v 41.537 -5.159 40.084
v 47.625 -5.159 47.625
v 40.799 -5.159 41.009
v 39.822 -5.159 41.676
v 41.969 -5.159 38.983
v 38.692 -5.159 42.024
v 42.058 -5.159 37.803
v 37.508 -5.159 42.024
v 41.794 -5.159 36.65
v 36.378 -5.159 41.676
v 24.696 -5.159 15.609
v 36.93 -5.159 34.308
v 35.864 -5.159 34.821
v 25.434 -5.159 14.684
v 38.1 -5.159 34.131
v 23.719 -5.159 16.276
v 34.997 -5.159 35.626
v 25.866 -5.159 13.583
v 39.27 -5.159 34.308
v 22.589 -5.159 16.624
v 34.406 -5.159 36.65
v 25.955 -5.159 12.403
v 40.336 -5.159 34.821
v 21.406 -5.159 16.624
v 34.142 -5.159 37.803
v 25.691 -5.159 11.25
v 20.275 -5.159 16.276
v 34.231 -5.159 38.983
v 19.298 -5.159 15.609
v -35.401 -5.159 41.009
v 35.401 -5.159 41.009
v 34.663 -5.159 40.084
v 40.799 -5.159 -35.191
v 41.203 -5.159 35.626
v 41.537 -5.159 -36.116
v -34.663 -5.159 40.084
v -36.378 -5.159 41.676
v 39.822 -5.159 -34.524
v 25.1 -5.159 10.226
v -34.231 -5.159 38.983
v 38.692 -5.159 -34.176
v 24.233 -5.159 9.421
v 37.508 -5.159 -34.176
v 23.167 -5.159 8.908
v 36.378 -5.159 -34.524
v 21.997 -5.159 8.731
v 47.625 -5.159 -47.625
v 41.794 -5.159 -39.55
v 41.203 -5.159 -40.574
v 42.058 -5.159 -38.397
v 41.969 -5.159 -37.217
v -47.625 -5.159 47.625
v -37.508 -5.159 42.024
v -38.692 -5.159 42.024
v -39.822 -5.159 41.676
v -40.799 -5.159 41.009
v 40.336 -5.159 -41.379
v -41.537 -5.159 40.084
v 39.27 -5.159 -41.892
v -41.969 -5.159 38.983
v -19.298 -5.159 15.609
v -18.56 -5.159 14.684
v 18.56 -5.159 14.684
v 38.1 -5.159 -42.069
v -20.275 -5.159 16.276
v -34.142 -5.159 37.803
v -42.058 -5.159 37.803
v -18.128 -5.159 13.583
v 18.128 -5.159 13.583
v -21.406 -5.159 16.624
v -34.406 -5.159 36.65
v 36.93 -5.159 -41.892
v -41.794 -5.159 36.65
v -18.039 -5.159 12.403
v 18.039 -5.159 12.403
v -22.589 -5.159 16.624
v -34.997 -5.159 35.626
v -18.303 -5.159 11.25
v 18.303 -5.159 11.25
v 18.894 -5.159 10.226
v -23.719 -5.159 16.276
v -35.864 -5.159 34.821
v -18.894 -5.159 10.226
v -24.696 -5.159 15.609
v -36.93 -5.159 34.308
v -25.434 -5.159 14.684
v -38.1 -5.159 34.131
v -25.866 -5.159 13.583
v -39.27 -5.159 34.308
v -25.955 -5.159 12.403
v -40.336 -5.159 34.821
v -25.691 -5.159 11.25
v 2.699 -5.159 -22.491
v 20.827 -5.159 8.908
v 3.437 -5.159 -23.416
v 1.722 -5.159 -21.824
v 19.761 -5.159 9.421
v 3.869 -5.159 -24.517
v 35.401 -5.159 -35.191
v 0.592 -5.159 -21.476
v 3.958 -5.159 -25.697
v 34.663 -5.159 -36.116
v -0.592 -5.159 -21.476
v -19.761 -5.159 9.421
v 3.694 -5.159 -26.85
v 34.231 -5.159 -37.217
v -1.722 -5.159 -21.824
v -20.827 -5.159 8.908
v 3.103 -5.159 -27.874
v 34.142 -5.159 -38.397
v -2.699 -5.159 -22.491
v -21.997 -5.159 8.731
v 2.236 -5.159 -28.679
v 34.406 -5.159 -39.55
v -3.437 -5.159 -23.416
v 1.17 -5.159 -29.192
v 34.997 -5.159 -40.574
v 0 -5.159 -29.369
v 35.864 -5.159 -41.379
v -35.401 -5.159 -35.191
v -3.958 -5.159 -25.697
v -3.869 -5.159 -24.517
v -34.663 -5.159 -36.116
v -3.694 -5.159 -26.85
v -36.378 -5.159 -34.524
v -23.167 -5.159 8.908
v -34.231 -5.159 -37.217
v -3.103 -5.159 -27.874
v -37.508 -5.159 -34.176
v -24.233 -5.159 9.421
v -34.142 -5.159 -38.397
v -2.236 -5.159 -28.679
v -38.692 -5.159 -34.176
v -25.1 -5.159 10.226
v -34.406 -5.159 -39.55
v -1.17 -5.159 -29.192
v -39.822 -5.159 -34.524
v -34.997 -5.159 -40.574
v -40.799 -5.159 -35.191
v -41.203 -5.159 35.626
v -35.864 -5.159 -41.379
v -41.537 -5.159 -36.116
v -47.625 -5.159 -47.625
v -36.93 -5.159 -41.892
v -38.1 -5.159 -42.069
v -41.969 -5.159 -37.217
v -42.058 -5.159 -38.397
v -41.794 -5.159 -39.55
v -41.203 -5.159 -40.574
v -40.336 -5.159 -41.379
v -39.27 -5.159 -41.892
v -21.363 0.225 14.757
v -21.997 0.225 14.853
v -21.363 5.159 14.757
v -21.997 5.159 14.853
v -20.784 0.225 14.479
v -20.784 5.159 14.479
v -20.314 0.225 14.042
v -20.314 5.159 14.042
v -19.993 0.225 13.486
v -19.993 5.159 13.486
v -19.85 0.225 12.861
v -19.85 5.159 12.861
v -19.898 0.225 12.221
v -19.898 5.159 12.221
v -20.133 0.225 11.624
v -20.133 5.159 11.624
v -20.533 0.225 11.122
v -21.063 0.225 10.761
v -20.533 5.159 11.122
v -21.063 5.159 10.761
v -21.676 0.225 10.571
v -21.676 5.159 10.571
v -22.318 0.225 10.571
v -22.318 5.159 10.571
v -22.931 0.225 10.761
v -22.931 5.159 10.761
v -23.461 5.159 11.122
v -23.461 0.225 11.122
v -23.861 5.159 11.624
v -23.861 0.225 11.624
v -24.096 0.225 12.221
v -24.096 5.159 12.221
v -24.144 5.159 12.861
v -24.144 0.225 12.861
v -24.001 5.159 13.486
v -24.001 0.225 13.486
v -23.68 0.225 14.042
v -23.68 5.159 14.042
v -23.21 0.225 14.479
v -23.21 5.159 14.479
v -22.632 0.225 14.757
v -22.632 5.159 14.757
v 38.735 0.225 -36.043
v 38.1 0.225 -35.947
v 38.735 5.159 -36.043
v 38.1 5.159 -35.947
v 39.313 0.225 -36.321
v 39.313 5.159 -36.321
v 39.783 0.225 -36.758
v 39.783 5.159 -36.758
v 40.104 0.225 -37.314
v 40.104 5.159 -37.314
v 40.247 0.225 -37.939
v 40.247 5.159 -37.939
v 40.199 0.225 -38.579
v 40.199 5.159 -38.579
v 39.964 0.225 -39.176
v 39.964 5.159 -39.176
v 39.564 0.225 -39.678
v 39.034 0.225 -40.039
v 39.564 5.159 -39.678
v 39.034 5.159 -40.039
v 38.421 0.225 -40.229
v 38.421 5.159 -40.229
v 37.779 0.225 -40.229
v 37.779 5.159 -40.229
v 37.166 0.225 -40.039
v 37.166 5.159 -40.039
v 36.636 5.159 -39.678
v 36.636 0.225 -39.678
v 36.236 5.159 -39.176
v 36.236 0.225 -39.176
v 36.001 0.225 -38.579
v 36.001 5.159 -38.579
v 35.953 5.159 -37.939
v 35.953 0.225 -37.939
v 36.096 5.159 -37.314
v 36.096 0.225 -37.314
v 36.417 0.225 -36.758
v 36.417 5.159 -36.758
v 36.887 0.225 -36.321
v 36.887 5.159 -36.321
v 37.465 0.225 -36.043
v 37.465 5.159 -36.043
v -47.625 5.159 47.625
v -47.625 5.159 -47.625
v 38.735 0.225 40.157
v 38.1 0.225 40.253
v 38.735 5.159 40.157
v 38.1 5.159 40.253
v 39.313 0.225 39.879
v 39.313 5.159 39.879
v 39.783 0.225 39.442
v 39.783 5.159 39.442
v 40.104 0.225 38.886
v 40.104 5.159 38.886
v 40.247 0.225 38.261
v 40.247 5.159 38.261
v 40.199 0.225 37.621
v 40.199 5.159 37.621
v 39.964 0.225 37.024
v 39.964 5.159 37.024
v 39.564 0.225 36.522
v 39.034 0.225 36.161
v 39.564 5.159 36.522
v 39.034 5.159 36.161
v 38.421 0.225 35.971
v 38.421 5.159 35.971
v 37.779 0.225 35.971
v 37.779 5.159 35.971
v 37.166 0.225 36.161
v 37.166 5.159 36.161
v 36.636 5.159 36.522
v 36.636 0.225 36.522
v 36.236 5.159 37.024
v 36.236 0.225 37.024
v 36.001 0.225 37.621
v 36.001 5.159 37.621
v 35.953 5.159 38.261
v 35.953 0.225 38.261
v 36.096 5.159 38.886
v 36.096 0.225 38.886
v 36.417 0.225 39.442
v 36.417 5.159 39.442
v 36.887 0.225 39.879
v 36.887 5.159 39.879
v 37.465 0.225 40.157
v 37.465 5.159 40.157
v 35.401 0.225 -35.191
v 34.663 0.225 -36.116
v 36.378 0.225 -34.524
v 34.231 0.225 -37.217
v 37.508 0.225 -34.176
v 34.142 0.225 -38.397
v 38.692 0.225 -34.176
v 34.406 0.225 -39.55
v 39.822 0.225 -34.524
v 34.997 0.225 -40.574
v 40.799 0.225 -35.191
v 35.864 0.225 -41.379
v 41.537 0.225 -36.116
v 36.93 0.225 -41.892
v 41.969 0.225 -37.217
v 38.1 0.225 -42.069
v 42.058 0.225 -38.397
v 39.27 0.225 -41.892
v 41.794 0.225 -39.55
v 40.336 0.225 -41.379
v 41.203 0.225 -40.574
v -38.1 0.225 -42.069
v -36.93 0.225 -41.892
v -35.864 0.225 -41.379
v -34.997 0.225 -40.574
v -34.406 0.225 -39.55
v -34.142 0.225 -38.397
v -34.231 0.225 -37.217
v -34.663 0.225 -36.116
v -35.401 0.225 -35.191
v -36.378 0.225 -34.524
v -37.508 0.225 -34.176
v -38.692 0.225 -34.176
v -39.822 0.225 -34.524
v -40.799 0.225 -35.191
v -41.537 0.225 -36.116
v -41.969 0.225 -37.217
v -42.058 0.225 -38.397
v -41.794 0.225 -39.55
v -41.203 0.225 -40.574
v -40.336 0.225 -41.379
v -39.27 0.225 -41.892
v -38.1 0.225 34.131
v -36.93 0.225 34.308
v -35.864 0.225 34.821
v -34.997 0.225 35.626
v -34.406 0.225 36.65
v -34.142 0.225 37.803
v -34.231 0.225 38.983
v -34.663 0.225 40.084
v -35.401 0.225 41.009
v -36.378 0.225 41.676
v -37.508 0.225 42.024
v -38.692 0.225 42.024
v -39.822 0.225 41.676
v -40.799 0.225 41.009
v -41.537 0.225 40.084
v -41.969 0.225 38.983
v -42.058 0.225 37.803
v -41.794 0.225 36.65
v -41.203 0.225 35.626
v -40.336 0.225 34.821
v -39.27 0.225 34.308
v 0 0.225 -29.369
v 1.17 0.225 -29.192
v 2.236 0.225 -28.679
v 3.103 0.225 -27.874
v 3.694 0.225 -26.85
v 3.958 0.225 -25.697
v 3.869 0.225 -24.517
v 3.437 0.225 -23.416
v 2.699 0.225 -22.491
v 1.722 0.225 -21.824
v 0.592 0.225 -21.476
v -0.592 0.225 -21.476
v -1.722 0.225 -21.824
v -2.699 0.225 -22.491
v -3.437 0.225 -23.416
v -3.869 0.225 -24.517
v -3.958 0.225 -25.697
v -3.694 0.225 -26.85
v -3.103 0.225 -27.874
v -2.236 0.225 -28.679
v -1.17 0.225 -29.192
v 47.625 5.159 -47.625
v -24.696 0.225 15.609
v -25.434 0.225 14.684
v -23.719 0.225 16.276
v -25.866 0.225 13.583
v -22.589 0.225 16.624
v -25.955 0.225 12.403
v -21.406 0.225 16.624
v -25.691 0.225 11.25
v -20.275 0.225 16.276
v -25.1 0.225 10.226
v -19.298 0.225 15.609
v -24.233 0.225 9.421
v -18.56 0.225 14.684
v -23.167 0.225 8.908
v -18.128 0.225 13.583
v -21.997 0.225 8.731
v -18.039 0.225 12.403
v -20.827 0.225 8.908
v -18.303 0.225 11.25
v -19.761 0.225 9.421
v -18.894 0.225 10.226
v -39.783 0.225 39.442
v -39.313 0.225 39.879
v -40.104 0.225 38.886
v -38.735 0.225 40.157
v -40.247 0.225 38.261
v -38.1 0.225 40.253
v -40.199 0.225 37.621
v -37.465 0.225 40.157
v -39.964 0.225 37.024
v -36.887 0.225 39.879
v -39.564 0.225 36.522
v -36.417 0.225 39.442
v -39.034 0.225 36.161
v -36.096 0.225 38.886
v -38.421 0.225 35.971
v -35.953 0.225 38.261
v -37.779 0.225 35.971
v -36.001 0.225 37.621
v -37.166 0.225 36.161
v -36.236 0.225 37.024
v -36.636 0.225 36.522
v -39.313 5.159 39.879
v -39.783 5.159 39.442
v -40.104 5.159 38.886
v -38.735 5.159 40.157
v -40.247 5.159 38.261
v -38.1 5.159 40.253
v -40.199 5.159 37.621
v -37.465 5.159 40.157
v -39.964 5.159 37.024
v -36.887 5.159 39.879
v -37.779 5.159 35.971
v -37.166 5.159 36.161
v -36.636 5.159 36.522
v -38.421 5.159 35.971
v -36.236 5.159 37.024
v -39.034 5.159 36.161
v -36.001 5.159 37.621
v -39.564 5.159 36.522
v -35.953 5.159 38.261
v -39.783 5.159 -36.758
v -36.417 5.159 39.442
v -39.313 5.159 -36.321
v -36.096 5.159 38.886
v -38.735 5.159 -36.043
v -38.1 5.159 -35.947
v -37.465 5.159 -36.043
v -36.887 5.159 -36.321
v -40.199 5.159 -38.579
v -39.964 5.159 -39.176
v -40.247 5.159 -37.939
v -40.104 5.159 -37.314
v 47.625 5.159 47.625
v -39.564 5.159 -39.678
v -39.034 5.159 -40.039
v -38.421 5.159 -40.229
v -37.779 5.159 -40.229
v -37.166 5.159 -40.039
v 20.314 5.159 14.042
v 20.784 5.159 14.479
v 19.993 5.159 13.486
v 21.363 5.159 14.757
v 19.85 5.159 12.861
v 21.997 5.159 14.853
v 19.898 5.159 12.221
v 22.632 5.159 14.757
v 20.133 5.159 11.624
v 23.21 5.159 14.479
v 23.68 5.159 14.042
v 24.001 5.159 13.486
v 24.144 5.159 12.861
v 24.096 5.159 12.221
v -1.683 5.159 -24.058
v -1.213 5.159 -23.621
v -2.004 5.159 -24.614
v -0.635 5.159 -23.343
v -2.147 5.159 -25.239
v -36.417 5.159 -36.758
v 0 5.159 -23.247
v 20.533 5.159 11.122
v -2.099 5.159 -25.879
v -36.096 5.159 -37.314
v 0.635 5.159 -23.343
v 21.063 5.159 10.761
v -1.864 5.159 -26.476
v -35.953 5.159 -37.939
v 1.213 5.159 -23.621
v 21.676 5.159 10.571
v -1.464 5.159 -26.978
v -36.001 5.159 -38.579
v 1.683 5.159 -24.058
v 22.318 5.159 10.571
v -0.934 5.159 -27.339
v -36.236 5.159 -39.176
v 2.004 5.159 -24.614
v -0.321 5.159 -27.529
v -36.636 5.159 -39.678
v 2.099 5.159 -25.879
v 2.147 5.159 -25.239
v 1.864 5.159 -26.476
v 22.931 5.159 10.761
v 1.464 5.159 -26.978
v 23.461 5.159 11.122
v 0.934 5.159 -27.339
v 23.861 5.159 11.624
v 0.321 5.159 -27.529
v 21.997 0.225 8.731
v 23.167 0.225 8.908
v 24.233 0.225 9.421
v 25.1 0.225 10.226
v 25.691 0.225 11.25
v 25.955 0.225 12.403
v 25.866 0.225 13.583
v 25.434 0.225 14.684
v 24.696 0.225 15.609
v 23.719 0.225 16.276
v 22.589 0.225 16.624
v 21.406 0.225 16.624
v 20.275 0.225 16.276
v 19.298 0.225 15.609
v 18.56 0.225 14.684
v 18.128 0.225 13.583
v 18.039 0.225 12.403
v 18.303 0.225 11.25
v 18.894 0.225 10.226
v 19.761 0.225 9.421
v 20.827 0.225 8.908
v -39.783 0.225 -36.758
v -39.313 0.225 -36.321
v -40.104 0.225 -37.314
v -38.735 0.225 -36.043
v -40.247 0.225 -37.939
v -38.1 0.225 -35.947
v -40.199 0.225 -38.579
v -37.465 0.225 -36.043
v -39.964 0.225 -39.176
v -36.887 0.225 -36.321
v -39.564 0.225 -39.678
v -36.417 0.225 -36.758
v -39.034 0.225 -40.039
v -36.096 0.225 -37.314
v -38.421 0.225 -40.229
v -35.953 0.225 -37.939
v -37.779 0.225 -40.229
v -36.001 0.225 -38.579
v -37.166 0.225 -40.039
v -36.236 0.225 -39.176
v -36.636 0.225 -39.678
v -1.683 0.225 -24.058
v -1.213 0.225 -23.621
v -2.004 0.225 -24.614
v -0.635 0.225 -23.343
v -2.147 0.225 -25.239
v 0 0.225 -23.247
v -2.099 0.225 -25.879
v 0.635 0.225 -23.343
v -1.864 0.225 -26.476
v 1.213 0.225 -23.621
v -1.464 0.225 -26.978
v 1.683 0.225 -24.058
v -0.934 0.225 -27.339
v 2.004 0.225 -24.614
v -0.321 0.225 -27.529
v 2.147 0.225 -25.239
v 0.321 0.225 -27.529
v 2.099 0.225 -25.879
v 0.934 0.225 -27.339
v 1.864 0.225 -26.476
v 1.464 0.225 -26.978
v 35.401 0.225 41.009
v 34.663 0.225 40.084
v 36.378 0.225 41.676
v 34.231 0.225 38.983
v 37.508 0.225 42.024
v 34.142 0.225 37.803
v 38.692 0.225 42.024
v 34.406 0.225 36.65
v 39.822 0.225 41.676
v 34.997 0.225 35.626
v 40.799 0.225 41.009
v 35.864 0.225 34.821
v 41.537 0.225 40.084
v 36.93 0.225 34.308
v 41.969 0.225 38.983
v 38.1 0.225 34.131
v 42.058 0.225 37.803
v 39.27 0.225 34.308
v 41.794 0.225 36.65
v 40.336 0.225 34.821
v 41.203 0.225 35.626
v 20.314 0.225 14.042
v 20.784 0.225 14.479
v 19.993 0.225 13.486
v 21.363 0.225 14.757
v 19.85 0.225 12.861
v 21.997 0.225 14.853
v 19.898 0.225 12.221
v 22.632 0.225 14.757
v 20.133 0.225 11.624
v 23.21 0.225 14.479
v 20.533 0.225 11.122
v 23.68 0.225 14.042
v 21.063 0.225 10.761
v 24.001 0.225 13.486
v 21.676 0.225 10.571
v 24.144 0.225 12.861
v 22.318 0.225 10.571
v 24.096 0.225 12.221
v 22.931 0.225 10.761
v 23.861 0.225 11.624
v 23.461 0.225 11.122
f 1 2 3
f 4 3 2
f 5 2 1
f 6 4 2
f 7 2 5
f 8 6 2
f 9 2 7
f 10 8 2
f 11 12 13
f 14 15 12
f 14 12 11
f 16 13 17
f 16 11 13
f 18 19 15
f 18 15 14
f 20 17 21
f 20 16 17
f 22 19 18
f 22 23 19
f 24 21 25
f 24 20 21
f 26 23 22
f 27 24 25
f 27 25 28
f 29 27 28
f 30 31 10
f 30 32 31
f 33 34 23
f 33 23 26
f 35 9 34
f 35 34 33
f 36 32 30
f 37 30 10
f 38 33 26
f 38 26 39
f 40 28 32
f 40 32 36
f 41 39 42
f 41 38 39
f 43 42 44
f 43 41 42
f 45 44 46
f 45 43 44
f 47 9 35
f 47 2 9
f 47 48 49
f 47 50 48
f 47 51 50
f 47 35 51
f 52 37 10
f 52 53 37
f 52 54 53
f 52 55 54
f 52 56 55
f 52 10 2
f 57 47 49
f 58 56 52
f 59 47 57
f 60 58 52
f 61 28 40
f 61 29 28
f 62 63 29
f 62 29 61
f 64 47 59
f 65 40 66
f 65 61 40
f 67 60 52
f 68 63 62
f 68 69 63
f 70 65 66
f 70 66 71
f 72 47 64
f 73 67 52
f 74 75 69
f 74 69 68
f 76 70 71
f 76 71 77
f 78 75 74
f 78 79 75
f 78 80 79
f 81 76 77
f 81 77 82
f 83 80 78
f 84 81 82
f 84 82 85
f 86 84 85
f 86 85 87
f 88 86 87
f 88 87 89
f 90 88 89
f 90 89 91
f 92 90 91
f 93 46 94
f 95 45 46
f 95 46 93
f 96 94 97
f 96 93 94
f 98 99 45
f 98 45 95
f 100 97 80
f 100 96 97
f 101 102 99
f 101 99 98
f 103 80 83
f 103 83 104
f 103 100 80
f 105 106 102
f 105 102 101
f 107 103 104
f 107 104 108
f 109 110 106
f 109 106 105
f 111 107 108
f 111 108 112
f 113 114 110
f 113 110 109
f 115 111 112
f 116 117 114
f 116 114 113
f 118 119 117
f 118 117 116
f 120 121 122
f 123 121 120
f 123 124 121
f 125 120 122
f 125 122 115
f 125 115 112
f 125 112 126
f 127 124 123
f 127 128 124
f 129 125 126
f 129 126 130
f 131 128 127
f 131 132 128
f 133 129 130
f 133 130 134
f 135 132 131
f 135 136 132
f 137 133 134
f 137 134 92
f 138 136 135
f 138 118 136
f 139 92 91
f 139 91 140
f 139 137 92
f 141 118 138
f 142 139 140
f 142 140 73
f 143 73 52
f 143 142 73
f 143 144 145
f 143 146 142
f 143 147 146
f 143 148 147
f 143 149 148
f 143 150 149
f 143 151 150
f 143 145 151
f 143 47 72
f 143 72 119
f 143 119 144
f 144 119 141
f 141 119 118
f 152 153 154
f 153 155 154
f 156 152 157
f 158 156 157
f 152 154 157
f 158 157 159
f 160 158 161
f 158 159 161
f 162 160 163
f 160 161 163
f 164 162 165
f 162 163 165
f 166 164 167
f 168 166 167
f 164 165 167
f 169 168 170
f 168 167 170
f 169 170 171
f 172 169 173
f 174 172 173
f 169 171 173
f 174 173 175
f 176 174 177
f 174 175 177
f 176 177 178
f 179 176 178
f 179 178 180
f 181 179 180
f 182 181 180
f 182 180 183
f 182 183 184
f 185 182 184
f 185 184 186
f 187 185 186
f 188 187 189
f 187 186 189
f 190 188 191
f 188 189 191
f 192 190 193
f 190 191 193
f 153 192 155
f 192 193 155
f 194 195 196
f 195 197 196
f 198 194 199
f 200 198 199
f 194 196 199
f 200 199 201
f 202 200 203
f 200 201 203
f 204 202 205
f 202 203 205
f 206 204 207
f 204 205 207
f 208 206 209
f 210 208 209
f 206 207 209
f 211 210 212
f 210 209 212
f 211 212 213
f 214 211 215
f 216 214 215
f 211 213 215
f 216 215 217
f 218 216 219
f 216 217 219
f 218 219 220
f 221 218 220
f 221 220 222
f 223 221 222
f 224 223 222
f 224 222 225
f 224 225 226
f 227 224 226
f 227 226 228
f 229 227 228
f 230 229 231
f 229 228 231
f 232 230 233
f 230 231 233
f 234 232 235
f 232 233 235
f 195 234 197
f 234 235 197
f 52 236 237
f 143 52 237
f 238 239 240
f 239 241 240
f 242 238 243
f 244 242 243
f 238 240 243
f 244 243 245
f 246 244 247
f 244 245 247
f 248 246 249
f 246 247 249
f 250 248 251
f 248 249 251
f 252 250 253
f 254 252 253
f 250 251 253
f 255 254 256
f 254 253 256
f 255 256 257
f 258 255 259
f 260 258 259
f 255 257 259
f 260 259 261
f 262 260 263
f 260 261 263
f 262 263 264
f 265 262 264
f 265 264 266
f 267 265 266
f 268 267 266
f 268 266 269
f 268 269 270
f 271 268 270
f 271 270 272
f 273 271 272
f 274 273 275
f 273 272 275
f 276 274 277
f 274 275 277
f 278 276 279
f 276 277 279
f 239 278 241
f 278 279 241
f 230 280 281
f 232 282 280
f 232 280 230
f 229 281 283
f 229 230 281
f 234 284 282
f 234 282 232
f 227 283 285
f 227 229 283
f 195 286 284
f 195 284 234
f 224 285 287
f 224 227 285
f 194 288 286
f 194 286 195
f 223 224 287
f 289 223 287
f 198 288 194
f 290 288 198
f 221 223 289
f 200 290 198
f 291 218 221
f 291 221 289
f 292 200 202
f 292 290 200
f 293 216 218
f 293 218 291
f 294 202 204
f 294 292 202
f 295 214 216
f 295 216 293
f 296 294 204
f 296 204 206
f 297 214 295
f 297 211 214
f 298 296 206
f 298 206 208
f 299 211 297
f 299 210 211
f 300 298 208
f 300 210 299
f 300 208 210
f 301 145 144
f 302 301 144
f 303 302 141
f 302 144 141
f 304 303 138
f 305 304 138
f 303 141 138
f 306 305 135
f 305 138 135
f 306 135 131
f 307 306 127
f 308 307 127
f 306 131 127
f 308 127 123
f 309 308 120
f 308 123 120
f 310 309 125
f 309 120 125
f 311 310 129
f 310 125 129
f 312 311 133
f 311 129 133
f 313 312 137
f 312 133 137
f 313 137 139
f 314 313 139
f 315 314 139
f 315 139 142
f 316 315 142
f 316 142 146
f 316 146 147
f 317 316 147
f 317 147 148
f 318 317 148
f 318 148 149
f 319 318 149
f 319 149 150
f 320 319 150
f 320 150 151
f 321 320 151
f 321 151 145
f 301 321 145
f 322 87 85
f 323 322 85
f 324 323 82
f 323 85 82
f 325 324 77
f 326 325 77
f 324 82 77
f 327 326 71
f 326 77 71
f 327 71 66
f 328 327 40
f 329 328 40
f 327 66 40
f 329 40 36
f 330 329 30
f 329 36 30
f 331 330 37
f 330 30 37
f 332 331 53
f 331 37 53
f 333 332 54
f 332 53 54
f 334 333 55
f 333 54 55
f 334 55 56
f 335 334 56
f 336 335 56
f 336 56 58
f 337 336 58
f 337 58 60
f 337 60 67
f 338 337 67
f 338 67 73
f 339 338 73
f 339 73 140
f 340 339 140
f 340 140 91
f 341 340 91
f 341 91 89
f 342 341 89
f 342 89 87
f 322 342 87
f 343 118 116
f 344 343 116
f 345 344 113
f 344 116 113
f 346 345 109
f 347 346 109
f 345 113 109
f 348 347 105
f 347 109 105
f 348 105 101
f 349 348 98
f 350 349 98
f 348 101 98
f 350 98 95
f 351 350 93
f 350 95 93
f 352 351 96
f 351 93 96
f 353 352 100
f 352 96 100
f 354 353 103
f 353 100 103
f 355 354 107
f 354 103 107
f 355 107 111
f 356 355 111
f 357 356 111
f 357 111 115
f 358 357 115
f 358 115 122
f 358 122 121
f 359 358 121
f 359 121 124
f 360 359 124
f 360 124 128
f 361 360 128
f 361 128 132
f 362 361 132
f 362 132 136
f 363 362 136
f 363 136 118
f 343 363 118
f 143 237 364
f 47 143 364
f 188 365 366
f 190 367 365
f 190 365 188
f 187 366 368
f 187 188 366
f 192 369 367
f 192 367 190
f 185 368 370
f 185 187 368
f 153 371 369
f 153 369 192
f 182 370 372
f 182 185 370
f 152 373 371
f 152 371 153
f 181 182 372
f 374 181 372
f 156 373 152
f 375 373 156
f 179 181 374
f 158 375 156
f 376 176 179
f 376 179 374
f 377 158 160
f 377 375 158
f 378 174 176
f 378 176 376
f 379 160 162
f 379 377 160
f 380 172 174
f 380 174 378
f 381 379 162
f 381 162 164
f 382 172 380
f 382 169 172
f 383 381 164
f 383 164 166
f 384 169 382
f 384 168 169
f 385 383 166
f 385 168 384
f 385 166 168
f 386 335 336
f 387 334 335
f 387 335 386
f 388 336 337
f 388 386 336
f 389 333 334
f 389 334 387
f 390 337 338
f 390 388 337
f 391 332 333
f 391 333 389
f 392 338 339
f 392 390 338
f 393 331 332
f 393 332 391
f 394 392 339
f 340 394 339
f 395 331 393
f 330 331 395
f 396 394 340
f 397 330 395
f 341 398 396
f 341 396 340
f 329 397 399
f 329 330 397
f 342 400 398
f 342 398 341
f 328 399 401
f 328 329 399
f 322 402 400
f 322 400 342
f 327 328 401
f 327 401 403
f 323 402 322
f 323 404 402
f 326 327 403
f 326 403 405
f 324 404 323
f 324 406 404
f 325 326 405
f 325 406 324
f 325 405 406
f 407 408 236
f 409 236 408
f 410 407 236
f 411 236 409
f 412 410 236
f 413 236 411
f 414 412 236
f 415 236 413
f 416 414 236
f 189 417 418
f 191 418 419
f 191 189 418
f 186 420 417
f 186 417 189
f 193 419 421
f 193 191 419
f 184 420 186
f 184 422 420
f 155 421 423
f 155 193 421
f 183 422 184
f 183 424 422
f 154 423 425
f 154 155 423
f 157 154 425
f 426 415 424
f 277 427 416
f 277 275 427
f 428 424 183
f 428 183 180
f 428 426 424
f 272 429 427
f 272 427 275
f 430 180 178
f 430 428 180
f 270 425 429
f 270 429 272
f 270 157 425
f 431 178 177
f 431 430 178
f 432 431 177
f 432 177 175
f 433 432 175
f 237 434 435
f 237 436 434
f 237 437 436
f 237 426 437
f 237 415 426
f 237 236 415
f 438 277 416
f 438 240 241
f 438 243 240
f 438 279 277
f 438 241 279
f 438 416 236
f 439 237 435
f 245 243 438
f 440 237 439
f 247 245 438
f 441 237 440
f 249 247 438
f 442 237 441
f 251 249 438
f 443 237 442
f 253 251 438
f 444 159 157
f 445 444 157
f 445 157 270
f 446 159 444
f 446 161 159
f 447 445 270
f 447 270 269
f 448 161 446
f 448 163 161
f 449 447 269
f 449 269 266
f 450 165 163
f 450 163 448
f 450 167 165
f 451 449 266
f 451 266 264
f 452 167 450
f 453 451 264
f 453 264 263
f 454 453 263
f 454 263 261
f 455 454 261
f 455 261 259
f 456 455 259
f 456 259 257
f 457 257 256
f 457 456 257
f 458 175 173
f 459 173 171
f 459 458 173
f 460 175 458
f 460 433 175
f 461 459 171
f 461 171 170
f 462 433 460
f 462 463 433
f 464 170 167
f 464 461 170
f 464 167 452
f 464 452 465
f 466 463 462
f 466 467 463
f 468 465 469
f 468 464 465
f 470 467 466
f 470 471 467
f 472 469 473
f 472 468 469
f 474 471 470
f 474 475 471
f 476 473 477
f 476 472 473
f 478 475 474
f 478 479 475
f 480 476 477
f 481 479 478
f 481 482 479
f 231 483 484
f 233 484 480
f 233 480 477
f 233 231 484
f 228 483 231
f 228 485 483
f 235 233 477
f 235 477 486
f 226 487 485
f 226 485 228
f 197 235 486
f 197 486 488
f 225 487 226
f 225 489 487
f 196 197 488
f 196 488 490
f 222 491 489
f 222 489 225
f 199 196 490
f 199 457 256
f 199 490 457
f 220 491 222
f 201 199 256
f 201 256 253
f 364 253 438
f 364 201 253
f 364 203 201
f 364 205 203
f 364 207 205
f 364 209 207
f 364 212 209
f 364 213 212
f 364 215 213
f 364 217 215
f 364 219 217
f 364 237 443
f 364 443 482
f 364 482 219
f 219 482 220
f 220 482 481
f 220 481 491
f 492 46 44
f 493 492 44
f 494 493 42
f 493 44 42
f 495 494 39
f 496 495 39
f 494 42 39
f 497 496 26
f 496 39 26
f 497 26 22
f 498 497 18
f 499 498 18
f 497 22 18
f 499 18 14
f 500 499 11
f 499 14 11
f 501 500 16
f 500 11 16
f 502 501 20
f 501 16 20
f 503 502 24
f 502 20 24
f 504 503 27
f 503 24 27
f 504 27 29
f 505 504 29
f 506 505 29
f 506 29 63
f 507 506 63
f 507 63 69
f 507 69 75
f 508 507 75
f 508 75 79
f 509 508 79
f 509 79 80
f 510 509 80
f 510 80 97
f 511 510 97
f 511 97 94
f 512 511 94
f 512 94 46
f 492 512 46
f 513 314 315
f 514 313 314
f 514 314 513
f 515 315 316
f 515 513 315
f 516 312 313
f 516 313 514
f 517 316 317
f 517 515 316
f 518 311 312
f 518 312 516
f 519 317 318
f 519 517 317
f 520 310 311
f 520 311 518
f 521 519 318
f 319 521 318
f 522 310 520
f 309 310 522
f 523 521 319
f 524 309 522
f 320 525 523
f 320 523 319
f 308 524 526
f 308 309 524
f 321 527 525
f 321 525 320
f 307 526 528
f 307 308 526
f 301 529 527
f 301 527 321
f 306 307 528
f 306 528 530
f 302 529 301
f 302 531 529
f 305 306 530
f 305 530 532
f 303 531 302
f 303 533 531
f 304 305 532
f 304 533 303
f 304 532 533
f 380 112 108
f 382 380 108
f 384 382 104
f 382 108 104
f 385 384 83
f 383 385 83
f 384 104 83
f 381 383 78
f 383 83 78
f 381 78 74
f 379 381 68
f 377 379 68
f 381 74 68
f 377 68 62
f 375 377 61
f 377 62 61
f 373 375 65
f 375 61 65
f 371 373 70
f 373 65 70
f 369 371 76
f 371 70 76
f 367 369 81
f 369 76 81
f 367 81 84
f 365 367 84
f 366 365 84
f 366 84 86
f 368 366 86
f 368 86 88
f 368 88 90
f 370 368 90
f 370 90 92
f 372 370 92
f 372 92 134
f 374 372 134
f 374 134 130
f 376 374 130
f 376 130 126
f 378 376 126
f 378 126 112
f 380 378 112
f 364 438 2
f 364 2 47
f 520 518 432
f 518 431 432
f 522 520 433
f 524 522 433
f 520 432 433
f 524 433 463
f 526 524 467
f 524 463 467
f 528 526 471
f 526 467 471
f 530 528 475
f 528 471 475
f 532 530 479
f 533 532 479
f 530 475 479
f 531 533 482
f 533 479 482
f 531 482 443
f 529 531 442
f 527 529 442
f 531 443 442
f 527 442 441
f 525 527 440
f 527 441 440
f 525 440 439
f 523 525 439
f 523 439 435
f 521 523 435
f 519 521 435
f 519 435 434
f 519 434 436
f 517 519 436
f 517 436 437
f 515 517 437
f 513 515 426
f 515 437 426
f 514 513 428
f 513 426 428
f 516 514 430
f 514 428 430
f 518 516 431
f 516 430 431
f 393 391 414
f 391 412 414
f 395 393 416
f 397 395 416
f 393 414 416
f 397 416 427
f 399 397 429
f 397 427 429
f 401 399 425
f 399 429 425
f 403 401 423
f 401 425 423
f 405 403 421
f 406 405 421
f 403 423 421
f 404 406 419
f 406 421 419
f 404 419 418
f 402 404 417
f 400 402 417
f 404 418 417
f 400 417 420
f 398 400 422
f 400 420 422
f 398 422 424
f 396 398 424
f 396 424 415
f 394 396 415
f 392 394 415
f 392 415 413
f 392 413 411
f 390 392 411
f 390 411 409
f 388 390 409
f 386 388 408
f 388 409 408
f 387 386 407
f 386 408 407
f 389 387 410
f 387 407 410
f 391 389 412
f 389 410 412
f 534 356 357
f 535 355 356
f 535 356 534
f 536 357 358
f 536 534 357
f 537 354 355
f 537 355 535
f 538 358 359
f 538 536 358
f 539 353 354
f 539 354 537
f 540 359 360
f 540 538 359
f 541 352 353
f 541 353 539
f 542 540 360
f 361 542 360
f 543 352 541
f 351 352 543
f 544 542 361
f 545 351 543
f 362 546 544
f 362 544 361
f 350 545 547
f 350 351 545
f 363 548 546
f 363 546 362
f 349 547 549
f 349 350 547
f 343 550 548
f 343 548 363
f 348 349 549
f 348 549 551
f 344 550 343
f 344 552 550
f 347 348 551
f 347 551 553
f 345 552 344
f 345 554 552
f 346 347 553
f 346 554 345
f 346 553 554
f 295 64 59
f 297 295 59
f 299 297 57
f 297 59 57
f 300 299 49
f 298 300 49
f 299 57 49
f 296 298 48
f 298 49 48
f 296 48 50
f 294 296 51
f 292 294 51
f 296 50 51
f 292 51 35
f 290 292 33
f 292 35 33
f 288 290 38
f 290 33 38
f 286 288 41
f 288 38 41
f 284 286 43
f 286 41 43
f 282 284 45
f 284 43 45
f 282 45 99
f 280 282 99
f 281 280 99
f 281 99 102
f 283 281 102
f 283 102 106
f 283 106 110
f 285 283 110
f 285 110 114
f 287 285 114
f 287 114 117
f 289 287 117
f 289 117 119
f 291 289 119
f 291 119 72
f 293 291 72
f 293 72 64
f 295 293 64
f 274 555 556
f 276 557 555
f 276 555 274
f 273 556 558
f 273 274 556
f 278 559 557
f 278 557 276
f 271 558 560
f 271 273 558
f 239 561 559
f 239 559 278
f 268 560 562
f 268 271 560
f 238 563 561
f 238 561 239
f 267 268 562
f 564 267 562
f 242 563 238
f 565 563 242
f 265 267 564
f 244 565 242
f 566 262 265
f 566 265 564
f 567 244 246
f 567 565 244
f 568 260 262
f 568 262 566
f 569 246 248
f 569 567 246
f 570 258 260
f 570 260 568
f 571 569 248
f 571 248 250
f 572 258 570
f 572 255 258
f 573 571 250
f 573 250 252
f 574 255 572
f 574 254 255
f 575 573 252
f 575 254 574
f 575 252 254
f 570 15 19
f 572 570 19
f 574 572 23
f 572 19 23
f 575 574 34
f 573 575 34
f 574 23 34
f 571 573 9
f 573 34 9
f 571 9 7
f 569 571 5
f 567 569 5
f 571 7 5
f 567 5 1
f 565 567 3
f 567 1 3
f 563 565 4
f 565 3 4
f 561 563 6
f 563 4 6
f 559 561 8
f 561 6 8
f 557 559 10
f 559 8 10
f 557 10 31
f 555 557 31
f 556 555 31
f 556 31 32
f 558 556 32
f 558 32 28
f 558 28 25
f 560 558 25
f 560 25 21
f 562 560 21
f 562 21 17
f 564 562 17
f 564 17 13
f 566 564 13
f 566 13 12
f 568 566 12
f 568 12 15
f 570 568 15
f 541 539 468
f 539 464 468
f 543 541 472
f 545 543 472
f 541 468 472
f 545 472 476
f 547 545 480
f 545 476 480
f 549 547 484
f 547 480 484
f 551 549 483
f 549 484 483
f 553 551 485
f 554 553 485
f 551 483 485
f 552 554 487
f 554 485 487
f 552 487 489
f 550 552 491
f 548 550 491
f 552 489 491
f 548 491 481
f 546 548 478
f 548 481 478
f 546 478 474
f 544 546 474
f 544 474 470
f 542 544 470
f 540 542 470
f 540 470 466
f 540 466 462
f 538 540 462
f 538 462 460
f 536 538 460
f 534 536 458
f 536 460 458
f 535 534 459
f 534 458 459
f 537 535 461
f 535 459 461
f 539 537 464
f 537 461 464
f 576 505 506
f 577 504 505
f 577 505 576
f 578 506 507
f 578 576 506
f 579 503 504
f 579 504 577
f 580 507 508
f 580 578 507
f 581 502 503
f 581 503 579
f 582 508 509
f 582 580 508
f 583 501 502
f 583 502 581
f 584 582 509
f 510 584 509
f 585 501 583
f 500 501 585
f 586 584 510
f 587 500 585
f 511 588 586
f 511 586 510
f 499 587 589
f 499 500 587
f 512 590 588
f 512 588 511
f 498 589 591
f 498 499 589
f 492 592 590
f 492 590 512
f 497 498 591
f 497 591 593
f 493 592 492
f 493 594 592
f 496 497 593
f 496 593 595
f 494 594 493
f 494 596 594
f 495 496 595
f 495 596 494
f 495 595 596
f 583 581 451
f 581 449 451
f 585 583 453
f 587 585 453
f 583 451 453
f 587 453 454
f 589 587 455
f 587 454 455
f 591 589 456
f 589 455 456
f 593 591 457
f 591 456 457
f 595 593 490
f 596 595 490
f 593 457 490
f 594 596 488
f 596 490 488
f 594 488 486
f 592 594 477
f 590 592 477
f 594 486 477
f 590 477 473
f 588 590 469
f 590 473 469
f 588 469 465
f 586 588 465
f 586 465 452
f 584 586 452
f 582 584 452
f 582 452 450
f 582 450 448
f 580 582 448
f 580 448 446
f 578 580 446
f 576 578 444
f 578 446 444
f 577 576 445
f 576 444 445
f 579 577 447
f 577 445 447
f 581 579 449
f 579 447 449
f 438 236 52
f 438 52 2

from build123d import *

# Parameters (mm, degrees)
SKETCH3_W                           = 101.6
SKETCH3_H                           = 11.1125
BOSS_EXTRUDE1_DEPTH                 = 50.8
BASEBORDERRADIUSSKETCH_OUTSIDE_W    = 132.41
BASEBORDERRADIUSSKETCH_OUTSIDE_H    = 132.41
BASEBORDERRADIUSSKETCH_OUTSIDE_W_2  = 95.25
BASEBORDERRADIUSSKETCH_OUTSIDE_H_2  = 95.25
BASEBORDERRADIUSCUT_EXTRUDE_DEPTH   = 73.57931249
BUMPER_6_32_TAPPED_HOLE_D           = 4.3053
BUMPER_6_32_TAPPED_HOLE_CBORE_D     = 7.9375
BUMPER_6_32_TAPPED_HOLE_CBORE_DEPTH = 5.3848
BUMPERTHREADLPATTERN_COUNT          = 2
BUMPERTHREADLPATTERN_PITCH          = 76.2
BUMPERTHREADLPATTERN_COUNT_DIR2     = 2
BUMPERTHREADLPATTERN_PITCH_DIR2     = 76.2


with BuildPart() as part:
    # Sketch3 → Boss-Extrude1 (new, symmetric)
    with BuildSketch(Plane.XY):
        Rectangle(SKETCH3_W, SKETCH3_H)
    extrude(amount=BOSS_EXTRUDE1_DEPTH, both=True)

    # FacingTopSurfaceCut
    split(bisect_by=Plane(origin=(0, 5.159375, 0), x_dir=(1, 0, 0), z_dir=(0, 1, 0)), keep=Keep.BOTTOM)

    # FacingBottomSurfaceCut
    split(bisect_by=Plane(origin=(0, -5.159375, 0), x_dir=(-1, 0, 0), z_dir=(0, -1, 0)), keep=Keep.BOTTOM)

    # BaseBorderRadiusSketch outside → BaseBorderRadiusCut-Extrude (cut, through all)
    with BuildSketch(Plane(origin=(0, 5.159375, 0), x_dir=(1, 0, 0), z_dir=(0, 1, 0))):
        Rectangle(BASEBORDERRADIUSSKETCH_OUTSIDE_W, BASEBORDERRADIUSSKETCH_OUTSIDE_H)
        Rectangle(BASEBORDERRADIUSSKETCH_OUTSIDE_W_2, BASEBORDERRADIUSSKETCH_OUTSIDE_H_2, mode=Mode.SUBTRACT)
    extrude(amount=-BASEBORDERRADIUSCUT_EXTRUDE_DEPTH, mode=Mode.SUBTRACT)

    # Bumper#6-32 Tapped Hole (through all)
    with Locations(Plane(origin=(-38.1, -5.159375, 38.1), x_dir=(0, 0, -1), z_dir=(0, -1, 0))):
        with Locations((0, 0), (25.4, 16.102954744), (25.4, 60.097045256), (63.5, 38.1)):
            bumper_6_32_tapped_hole = CounterBoreHole(BUMPER_6_32_TAPPED_HOLE_D / 2, BUMPER_6_32_TAPPED_HOLE_CBORE_D / 2, BUMPER_6_32_TAPPED_HOLE_CBORE_DEPTH)

    # BumperThreadLPattern: Bumper_6-32 Tapped Hole 2 × 2
    with Locations(*[(j * BUMPERTHREADLPATTERN_PITCH_DIR2, 0, -i * BUMPERTHREADLPATTERN_PITCH) for i in range(BUMPERTHREADLPATTERN_COUNT) for j in range(BUMPERTHREADLPATTERN_COUNT_DIR2) if (i, j) != (0, 0)]):
        add(bumper_6_32_tapped_hole, mode=Mode.SUBTRACT)


solid = part.part
